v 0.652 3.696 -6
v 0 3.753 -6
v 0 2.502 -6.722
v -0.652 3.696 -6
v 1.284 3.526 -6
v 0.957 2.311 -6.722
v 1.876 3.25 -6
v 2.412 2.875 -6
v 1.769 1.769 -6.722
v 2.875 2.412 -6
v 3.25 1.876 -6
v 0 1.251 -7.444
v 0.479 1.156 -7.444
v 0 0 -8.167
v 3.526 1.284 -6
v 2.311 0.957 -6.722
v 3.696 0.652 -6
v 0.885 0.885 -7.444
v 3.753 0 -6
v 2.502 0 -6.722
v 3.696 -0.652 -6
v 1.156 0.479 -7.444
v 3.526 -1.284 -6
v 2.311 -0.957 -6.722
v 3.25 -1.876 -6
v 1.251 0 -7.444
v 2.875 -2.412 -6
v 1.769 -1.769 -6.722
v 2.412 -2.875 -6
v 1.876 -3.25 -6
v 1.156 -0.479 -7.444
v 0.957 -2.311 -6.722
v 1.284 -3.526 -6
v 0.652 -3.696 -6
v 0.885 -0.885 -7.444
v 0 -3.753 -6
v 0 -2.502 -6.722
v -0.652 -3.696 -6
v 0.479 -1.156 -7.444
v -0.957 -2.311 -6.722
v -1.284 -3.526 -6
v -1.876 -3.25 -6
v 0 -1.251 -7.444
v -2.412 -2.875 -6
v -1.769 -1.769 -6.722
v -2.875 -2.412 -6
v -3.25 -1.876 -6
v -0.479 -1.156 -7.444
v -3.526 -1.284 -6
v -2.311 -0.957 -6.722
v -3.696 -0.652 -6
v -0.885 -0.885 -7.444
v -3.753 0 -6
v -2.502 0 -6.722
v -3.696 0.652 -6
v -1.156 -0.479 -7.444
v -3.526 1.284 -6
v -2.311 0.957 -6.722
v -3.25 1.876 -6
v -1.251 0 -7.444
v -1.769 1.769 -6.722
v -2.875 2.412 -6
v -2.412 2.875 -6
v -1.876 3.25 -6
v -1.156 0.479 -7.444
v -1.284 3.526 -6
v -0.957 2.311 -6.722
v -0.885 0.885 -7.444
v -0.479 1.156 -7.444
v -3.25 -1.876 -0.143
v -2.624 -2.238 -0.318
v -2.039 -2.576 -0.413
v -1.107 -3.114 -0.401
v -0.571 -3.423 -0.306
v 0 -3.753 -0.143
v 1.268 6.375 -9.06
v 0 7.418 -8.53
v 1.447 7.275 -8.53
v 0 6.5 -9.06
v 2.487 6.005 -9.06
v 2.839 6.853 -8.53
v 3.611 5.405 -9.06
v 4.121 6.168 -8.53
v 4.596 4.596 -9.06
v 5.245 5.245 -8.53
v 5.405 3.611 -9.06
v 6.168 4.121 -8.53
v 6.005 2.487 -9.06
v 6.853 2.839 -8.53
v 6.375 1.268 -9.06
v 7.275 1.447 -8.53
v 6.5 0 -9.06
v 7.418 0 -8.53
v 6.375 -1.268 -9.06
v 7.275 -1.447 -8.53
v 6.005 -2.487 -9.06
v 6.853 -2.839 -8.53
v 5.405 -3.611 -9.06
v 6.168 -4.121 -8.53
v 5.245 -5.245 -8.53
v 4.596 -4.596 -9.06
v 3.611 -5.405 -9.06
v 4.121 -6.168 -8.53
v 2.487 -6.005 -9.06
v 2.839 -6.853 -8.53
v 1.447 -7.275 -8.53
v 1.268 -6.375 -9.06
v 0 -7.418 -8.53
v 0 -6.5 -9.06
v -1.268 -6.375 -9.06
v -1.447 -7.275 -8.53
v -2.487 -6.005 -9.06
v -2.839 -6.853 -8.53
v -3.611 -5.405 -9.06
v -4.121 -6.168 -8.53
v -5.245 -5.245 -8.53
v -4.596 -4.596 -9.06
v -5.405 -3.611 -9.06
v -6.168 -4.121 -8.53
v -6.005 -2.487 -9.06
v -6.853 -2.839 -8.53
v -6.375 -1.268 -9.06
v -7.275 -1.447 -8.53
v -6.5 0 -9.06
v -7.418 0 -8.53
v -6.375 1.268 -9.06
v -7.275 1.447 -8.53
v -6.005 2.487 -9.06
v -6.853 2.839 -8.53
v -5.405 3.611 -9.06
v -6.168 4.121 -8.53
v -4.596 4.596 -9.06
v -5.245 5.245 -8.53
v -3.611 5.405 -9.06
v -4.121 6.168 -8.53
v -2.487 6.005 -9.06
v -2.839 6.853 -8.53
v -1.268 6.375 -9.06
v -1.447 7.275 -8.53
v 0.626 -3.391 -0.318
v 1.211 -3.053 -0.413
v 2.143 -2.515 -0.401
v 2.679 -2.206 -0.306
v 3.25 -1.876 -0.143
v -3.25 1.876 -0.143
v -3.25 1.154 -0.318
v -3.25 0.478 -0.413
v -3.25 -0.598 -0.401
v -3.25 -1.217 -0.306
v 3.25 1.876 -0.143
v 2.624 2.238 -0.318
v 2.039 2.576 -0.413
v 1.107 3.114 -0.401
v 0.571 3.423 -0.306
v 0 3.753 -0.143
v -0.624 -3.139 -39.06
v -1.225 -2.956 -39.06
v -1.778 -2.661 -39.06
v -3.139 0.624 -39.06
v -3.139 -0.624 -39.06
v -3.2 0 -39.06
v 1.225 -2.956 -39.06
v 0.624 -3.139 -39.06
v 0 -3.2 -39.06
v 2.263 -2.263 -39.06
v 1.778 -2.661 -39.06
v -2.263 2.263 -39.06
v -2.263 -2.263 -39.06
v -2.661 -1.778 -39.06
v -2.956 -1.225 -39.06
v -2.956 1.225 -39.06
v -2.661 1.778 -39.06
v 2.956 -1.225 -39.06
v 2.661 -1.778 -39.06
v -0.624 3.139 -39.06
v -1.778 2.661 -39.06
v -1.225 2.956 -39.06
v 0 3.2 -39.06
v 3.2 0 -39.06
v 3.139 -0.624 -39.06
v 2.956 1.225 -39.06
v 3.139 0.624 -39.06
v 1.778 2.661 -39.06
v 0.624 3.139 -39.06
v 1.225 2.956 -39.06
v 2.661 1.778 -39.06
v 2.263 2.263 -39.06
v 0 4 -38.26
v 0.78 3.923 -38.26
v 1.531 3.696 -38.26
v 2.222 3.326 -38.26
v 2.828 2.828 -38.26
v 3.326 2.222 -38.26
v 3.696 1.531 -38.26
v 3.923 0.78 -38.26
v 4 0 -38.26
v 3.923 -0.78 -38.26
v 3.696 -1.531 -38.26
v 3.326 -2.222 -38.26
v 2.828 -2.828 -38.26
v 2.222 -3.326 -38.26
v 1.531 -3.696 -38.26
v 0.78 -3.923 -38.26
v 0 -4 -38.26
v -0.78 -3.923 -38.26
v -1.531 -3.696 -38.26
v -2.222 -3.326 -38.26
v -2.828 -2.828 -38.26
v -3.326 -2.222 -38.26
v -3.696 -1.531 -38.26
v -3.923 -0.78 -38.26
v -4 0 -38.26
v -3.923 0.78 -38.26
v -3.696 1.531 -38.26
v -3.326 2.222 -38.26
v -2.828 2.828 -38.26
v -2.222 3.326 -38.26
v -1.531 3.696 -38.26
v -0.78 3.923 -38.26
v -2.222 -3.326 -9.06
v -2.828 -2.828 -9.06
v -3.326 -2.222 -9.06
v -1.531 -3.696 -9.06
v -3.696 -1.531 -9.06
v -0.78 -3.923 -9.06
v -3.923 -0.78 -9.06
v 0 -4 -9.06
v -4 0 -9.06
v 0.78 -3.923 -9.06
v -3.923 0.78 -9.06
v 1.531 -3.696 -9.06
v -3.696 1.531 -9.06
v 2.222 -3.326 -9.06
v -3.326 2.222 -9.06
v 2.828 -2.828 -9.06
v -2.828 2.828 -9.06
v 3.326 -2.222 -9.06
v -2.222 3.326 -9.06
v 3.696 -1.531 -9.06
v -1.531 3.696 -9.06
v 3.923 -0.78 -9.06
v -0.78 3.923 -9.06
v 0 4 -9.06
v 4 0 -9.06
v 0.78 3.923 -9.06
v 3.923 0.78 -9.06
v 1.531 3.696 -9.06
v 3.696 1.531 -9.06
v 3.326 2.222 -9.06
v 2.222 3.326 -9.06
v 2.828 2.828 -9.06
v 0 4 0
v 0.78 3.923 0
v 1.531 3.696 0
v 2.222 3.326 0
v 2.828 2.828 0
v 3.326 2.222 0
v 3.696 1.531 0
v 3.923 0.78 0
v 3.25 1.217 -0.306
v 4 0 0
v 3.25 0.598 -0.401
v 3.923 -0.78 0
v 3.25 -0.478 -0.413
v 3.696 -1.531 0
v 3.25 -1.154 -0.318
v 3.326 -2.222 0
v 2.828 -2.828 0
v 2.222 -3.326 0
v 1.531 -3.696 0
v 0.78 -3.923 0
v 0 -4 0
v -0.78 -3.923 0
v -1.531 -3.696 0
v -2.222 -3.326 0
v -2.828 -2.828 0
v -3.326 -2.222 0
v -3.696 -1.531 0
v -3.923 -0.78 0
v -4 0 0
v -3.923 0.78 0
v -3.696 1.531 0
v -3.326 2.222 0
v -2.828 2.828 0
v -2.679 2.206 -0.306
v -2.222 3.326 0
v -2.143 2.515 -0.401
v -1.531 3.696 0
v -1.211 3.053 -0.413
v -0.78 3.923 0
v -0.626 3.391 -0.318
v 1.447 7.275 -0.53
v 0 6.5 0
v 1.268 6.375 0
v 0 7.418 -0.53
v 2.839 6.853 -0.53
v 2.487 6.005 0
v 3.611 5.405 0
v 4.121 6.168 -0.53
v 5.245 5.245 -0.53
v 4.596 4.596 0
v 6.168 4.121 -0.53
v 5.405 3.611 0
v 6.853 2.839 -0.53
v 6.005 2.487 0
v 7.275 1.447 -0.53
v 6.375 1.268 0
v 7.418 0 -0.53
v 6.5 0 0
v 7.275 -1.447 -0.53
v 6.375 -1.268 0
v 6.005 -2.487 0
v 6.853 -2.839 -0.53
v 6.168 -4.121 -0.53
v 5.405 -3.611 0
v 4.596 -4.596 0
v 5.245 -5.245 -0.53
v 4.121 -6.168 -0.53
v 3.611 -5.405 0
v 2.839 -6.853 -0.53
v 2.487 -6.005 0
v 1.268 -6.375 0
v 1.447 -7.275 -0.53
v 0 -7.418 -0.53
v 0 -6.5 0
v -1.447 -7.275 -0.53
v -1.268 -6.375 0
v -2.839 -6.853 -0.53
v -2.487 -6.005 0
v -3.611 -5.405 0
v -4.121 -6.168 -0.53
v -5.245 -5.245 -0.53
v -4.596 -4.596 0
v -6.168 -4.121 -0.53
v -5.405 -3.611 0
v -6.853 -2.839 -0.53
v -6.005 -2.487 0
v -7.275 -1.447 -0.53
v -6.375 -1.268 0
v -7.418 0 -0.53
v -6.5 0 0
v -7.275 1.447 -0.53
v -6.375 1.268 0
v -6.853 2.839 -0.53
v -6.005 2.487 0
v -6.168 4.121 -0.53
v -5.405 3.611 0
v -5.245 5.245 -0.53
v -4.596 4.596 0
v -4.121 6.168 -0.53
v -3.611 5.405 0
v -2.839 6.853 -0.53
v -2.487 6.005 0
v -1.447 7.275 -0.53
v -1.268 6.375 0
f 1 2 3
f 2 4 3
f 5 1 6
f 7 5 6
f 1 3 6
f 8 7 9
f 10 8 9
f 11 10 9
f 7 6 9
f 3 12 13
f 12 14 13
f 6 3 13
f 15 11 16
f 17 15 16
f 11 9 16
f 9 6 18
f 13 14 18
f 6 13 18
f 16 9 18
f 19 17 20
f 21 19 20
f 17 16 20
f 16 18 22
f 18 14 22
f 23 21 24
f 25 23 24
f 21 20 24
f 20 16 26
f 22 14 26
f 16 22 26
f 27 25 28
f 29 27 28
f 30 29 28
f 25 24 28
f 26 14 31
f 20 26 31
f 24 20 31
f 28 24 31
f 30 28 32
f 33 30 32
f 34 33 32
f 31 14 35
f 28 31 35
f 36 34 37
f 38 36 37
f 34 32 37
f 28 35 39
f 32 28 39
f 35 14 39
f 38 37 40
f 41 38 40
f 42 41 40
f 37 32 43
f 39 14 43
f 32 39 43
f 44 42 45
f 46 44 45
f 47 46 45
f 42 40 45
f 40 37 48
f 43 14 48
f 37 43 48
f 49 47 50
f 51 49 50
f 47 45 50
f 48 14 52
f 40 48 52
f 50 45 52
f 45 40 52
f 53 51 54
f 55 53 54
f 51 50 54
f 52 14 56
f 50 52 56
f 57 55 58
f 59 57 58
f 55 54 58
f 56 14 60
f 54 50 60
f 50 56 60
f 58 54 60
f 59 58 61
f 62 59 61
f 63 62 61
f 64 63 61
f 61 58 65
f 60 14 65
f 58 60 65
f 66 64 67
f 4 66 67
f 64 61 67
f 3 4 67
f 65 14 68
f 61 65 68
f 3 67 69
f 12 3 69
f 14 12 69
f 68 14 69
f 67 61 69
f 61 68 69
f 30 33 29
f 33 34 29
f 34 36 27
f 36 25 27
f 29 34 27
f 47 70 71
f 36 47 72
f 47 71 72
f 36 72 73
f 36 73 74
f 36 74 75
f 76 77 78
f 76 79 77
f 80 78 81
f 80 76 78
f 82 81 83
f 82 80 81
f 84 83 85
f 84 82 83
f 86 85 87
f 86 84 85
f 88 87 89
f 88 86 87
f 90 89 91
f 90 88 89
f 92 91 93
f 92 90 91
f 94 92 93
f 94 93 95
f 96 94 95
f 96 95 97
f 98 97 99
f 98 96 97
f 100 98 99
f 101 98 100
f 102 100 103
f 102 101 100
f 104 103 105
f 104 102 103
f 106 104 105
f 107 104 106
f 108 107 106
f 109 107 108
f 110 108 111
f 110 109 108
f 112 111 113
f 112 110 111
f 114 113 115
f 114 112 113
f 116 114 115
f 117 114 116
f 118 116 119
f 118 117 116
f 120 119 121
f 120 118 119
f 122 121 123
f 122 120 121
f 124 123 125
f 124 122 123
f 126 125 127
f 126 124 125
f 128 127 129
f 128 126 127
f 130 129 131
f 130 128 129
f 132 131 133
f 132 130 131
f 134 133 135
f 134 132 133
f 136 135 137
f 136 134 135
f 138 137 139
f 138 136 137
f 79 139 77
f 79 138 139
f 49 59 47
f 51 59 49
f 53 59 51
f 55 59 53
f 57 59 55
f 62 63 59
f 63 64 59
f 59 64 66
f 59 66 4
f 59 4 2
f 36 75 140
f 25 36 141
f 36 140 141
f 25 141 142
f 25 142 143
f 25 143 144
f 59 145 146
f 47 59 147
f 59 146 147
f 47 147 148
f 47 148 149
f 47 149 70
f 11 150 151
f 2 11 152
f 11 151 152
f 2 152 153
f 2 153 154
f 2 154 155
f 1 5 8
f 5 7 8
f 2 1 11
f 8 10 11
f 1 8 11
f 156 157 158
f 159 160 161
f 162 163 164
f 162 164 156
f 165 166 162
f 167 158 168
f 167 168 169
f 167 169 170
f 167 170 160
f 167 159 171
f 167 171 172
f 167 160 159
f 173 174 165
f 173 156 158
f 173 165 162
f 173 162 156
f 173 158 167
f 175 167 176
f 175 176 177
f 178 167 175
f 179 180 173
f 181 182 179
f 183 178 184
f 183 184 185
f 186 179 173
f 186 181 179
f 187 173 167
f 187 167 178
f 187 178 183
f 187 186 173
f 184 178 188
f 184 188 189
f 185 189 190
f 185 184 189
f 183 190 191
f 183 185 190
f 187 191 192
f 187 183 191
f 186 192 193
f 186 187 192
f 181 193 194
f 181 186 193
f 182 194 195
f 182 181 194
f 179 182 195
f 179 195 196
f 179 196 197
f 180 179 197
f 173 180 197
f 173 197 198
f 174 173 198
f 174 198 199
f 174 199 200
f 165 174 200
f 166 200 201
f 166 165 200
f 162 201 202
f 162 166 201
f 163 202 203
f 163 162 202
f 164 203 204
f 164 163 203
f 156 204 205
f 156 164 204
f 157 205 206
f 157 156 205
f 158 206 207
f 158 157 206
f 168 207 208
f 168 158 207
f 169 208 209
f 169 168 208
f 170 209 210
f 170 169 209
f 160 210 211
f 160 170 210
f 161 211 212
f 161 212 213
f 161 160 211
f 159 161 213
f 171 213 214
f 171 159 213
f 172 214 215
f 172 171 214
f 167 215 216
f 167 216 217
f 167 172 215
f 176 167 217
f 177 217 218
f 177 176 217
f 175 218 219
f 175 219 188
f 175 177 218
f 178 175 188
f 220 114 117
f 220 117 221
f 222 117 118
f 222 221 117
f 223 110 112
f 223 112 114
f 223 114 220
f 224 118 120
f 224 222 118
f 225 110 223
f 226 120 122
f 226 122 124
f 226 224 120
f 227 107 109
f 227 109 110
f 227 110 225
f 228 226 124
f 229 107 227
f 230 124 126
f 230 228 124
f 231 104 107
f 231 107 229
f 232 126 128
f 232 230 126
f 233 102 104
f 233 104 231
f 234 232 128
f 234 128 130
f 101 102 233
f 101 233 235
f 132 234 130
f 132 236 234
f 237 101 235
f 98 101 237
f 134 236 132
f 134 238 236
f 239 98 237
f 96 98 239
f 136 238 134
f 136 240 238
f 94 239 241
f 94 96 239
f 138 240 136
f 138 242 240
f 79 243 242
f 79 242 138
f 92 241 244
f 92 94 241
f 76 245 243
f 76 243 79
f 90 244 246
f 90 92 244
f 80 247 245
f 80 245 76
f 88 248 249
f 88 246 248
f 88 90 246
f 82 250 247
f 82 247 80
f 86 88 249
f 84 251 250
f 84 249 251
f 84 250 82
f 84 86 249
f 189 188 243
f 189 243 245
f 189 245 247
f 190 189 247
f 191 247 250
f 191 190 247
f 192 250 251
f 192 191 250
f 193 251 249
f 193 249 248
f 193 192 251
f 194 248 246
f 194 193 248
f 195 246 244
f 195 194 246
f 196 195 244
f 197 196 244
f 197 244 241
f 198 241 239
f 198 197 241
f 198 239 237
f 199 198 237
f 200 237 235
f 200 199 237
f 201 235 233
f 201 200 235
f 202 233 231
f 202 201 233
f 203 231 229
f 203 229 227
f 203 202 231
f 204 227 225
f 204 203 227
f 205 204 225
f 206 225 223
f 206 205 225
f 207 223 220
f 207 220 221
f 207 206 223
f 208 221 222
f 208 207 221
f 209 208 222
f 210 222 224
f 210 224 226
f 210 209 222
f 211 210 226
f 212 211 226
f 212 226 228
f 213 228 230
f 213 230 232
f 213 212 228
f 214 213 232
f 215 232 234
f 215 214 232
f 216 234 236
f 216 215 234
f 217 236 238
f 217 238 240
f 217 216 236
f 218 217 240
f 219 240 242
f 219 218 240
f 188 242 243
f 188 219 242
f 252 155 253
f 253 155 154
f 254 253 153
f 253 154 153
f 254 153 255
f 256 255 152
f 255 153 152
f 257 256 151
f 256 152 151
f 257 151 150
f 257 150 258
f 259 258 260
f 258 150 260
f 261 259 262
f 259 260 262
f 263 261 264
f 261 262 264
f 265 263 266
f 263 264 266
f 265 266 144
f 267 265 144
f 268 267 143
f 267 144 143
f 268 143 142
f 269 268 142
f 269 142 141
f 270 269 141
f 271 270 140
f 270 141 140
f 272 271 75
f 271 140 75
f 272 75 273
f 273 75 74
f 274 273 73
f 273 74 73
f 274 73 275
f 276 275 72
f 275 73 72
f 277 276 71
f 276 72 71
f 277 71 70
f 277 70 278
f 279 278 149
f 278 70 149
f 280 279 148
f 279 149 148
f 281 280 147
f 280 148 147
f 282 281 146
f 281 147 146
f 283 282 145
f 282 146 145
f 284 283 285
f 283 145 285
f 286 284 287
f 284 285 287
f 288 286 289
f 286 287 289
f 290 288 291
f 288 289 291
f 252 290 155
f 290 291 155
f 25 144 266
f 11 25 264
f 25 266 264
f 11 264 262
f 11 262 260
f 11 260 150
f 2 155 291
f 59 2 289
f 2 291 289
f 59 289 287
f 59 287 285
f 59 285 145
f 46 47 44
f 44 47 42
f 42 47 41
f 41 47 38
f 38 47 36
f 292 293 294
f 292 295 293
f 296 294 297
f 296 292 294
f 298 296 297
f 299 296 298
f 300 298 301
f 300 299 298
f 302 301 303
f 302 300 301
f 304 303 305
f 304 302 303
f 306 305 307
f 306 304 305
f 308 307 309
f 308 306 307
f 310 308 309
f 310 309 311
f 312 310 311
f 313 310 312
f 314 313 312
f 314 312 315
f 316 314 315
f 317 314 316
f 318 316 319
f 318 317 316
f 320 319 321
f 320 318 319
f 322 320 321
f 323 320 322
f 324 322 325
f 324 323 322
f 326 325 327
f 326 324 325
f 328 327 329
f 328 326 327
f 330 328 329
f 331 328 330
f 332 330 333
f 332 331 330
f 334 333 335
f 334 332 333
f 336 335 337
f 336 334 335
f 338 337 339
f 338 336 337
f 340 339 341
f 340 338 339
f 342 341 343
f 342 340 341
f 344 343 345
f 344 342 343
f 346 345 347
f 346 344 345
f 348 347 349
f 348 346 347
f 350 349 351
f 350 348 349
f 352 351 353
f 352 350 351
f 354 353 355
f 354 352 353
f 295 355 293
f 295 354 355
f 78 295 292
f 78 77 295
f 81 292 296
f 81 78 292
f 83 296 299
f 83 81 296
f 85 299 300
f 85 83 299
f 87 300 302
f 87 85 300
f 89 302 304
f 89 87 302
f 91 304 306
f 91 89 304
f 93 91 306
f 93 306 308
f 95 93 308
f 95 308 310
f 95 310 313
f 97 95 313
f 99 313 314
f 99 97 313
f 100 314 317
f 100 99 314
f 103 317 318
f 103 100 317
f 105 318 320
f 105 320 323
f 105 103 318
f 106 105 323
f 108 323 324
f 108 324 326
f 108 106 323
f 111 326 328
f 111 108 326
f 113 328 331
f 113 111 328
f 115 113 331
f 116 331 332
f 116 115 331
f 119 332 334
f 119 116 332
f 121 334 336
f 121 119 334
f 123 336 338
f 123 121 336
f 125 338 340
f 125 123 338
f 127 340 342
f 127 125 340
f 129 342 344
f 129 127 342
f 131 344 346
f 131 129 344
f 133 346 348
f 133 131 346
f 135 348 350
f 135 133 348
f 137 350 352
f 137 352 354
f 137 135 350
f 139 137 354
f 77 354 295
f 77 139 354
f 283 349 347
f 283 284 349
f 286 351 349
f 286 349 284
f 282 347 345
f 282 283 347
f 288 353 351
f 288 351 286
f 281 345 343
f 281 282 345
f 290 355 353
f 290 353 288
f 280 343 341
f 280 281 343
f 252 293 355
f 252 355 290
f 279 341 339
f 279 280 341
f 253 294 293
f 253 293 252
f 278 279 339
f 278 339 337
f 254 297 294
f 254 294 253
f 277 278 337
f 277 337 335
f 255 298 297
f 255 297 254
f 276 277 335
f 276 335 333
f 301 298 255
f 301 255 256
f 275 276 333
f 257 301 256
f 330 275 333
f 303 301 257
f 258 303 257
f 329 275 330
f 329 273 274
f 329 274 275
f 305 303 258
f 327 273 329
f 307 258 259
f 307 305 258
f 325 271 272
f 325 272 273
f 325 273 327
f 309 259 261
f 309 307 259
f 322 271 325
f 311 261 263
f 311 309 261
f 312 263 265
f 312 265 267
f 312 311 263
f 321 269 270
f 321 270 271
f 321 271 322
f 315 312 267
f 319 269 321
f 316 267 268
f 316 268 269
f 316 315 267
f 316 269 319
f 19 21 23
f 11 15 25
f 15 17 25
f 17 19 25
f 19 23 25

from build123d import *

# Parameters (mm, degrees)
CHAMFER1_SIZE      = 0.8
CUT_EXTRUDE1_DEPTH = 6


with BuildPart() as part:
    # Sketch1 → Revolve1 (revolve)
    with BuildSketch(Plane(origin=(0, 0, 0), x_dir=(0, 0, -1), z_dir=(1, 0, 0))):
        Polygon((0, 0), (0, 6.5), (0.53, 7.417986928), (8.53, 7.417986928), (9.06, 6.5), (9.06, 4), (39.06, 4), (39.06, 0), align=None)
    revolve(axis=Axis((0, 0, 0), (0, 0, -1)))

    # Chamfer1
    chamfer1_edges = [part.edges().sort_by_distance(p)[0] for p in [
        (0, -4, -39.06),
    ]]
    chamfer(chamfer1_edges, length=CHAMFER1_SIZE)

    # Sketch2 → Cut-Extrude1 (cut)
    with BuildSketch(Plane.XY):
        Polygon((3.25, -1.876388375), (3.25, 1.876388375), (0, 3.75277675), (-3.25, 1.876388375), (-3.25, -1.876388375), (0, -3.75277675), align=None)
    extrude(amount=-CUT_EXTRUDE1_DEPTH, mode=Mode.SUBTRACT)

    # Sketch3 → Cut-Revolve1 (revolve, cut)
    with BuildSketch(Plane(origin=(0, 0, 0), x_dir=(0, 0, -1), z_dir=(1, 0, 0))):
        Polygon((0, 0), (0, 4), (2.309401077, 0), align=None)
        Polygon((8.166666667, 0), (6, 0), (6, 3.75277675), align=None)
    revolve(axis=Axis((0, 0, 0), (0, 0, -1)), mode=Mode.SUBTRACT)


solid = part.part
